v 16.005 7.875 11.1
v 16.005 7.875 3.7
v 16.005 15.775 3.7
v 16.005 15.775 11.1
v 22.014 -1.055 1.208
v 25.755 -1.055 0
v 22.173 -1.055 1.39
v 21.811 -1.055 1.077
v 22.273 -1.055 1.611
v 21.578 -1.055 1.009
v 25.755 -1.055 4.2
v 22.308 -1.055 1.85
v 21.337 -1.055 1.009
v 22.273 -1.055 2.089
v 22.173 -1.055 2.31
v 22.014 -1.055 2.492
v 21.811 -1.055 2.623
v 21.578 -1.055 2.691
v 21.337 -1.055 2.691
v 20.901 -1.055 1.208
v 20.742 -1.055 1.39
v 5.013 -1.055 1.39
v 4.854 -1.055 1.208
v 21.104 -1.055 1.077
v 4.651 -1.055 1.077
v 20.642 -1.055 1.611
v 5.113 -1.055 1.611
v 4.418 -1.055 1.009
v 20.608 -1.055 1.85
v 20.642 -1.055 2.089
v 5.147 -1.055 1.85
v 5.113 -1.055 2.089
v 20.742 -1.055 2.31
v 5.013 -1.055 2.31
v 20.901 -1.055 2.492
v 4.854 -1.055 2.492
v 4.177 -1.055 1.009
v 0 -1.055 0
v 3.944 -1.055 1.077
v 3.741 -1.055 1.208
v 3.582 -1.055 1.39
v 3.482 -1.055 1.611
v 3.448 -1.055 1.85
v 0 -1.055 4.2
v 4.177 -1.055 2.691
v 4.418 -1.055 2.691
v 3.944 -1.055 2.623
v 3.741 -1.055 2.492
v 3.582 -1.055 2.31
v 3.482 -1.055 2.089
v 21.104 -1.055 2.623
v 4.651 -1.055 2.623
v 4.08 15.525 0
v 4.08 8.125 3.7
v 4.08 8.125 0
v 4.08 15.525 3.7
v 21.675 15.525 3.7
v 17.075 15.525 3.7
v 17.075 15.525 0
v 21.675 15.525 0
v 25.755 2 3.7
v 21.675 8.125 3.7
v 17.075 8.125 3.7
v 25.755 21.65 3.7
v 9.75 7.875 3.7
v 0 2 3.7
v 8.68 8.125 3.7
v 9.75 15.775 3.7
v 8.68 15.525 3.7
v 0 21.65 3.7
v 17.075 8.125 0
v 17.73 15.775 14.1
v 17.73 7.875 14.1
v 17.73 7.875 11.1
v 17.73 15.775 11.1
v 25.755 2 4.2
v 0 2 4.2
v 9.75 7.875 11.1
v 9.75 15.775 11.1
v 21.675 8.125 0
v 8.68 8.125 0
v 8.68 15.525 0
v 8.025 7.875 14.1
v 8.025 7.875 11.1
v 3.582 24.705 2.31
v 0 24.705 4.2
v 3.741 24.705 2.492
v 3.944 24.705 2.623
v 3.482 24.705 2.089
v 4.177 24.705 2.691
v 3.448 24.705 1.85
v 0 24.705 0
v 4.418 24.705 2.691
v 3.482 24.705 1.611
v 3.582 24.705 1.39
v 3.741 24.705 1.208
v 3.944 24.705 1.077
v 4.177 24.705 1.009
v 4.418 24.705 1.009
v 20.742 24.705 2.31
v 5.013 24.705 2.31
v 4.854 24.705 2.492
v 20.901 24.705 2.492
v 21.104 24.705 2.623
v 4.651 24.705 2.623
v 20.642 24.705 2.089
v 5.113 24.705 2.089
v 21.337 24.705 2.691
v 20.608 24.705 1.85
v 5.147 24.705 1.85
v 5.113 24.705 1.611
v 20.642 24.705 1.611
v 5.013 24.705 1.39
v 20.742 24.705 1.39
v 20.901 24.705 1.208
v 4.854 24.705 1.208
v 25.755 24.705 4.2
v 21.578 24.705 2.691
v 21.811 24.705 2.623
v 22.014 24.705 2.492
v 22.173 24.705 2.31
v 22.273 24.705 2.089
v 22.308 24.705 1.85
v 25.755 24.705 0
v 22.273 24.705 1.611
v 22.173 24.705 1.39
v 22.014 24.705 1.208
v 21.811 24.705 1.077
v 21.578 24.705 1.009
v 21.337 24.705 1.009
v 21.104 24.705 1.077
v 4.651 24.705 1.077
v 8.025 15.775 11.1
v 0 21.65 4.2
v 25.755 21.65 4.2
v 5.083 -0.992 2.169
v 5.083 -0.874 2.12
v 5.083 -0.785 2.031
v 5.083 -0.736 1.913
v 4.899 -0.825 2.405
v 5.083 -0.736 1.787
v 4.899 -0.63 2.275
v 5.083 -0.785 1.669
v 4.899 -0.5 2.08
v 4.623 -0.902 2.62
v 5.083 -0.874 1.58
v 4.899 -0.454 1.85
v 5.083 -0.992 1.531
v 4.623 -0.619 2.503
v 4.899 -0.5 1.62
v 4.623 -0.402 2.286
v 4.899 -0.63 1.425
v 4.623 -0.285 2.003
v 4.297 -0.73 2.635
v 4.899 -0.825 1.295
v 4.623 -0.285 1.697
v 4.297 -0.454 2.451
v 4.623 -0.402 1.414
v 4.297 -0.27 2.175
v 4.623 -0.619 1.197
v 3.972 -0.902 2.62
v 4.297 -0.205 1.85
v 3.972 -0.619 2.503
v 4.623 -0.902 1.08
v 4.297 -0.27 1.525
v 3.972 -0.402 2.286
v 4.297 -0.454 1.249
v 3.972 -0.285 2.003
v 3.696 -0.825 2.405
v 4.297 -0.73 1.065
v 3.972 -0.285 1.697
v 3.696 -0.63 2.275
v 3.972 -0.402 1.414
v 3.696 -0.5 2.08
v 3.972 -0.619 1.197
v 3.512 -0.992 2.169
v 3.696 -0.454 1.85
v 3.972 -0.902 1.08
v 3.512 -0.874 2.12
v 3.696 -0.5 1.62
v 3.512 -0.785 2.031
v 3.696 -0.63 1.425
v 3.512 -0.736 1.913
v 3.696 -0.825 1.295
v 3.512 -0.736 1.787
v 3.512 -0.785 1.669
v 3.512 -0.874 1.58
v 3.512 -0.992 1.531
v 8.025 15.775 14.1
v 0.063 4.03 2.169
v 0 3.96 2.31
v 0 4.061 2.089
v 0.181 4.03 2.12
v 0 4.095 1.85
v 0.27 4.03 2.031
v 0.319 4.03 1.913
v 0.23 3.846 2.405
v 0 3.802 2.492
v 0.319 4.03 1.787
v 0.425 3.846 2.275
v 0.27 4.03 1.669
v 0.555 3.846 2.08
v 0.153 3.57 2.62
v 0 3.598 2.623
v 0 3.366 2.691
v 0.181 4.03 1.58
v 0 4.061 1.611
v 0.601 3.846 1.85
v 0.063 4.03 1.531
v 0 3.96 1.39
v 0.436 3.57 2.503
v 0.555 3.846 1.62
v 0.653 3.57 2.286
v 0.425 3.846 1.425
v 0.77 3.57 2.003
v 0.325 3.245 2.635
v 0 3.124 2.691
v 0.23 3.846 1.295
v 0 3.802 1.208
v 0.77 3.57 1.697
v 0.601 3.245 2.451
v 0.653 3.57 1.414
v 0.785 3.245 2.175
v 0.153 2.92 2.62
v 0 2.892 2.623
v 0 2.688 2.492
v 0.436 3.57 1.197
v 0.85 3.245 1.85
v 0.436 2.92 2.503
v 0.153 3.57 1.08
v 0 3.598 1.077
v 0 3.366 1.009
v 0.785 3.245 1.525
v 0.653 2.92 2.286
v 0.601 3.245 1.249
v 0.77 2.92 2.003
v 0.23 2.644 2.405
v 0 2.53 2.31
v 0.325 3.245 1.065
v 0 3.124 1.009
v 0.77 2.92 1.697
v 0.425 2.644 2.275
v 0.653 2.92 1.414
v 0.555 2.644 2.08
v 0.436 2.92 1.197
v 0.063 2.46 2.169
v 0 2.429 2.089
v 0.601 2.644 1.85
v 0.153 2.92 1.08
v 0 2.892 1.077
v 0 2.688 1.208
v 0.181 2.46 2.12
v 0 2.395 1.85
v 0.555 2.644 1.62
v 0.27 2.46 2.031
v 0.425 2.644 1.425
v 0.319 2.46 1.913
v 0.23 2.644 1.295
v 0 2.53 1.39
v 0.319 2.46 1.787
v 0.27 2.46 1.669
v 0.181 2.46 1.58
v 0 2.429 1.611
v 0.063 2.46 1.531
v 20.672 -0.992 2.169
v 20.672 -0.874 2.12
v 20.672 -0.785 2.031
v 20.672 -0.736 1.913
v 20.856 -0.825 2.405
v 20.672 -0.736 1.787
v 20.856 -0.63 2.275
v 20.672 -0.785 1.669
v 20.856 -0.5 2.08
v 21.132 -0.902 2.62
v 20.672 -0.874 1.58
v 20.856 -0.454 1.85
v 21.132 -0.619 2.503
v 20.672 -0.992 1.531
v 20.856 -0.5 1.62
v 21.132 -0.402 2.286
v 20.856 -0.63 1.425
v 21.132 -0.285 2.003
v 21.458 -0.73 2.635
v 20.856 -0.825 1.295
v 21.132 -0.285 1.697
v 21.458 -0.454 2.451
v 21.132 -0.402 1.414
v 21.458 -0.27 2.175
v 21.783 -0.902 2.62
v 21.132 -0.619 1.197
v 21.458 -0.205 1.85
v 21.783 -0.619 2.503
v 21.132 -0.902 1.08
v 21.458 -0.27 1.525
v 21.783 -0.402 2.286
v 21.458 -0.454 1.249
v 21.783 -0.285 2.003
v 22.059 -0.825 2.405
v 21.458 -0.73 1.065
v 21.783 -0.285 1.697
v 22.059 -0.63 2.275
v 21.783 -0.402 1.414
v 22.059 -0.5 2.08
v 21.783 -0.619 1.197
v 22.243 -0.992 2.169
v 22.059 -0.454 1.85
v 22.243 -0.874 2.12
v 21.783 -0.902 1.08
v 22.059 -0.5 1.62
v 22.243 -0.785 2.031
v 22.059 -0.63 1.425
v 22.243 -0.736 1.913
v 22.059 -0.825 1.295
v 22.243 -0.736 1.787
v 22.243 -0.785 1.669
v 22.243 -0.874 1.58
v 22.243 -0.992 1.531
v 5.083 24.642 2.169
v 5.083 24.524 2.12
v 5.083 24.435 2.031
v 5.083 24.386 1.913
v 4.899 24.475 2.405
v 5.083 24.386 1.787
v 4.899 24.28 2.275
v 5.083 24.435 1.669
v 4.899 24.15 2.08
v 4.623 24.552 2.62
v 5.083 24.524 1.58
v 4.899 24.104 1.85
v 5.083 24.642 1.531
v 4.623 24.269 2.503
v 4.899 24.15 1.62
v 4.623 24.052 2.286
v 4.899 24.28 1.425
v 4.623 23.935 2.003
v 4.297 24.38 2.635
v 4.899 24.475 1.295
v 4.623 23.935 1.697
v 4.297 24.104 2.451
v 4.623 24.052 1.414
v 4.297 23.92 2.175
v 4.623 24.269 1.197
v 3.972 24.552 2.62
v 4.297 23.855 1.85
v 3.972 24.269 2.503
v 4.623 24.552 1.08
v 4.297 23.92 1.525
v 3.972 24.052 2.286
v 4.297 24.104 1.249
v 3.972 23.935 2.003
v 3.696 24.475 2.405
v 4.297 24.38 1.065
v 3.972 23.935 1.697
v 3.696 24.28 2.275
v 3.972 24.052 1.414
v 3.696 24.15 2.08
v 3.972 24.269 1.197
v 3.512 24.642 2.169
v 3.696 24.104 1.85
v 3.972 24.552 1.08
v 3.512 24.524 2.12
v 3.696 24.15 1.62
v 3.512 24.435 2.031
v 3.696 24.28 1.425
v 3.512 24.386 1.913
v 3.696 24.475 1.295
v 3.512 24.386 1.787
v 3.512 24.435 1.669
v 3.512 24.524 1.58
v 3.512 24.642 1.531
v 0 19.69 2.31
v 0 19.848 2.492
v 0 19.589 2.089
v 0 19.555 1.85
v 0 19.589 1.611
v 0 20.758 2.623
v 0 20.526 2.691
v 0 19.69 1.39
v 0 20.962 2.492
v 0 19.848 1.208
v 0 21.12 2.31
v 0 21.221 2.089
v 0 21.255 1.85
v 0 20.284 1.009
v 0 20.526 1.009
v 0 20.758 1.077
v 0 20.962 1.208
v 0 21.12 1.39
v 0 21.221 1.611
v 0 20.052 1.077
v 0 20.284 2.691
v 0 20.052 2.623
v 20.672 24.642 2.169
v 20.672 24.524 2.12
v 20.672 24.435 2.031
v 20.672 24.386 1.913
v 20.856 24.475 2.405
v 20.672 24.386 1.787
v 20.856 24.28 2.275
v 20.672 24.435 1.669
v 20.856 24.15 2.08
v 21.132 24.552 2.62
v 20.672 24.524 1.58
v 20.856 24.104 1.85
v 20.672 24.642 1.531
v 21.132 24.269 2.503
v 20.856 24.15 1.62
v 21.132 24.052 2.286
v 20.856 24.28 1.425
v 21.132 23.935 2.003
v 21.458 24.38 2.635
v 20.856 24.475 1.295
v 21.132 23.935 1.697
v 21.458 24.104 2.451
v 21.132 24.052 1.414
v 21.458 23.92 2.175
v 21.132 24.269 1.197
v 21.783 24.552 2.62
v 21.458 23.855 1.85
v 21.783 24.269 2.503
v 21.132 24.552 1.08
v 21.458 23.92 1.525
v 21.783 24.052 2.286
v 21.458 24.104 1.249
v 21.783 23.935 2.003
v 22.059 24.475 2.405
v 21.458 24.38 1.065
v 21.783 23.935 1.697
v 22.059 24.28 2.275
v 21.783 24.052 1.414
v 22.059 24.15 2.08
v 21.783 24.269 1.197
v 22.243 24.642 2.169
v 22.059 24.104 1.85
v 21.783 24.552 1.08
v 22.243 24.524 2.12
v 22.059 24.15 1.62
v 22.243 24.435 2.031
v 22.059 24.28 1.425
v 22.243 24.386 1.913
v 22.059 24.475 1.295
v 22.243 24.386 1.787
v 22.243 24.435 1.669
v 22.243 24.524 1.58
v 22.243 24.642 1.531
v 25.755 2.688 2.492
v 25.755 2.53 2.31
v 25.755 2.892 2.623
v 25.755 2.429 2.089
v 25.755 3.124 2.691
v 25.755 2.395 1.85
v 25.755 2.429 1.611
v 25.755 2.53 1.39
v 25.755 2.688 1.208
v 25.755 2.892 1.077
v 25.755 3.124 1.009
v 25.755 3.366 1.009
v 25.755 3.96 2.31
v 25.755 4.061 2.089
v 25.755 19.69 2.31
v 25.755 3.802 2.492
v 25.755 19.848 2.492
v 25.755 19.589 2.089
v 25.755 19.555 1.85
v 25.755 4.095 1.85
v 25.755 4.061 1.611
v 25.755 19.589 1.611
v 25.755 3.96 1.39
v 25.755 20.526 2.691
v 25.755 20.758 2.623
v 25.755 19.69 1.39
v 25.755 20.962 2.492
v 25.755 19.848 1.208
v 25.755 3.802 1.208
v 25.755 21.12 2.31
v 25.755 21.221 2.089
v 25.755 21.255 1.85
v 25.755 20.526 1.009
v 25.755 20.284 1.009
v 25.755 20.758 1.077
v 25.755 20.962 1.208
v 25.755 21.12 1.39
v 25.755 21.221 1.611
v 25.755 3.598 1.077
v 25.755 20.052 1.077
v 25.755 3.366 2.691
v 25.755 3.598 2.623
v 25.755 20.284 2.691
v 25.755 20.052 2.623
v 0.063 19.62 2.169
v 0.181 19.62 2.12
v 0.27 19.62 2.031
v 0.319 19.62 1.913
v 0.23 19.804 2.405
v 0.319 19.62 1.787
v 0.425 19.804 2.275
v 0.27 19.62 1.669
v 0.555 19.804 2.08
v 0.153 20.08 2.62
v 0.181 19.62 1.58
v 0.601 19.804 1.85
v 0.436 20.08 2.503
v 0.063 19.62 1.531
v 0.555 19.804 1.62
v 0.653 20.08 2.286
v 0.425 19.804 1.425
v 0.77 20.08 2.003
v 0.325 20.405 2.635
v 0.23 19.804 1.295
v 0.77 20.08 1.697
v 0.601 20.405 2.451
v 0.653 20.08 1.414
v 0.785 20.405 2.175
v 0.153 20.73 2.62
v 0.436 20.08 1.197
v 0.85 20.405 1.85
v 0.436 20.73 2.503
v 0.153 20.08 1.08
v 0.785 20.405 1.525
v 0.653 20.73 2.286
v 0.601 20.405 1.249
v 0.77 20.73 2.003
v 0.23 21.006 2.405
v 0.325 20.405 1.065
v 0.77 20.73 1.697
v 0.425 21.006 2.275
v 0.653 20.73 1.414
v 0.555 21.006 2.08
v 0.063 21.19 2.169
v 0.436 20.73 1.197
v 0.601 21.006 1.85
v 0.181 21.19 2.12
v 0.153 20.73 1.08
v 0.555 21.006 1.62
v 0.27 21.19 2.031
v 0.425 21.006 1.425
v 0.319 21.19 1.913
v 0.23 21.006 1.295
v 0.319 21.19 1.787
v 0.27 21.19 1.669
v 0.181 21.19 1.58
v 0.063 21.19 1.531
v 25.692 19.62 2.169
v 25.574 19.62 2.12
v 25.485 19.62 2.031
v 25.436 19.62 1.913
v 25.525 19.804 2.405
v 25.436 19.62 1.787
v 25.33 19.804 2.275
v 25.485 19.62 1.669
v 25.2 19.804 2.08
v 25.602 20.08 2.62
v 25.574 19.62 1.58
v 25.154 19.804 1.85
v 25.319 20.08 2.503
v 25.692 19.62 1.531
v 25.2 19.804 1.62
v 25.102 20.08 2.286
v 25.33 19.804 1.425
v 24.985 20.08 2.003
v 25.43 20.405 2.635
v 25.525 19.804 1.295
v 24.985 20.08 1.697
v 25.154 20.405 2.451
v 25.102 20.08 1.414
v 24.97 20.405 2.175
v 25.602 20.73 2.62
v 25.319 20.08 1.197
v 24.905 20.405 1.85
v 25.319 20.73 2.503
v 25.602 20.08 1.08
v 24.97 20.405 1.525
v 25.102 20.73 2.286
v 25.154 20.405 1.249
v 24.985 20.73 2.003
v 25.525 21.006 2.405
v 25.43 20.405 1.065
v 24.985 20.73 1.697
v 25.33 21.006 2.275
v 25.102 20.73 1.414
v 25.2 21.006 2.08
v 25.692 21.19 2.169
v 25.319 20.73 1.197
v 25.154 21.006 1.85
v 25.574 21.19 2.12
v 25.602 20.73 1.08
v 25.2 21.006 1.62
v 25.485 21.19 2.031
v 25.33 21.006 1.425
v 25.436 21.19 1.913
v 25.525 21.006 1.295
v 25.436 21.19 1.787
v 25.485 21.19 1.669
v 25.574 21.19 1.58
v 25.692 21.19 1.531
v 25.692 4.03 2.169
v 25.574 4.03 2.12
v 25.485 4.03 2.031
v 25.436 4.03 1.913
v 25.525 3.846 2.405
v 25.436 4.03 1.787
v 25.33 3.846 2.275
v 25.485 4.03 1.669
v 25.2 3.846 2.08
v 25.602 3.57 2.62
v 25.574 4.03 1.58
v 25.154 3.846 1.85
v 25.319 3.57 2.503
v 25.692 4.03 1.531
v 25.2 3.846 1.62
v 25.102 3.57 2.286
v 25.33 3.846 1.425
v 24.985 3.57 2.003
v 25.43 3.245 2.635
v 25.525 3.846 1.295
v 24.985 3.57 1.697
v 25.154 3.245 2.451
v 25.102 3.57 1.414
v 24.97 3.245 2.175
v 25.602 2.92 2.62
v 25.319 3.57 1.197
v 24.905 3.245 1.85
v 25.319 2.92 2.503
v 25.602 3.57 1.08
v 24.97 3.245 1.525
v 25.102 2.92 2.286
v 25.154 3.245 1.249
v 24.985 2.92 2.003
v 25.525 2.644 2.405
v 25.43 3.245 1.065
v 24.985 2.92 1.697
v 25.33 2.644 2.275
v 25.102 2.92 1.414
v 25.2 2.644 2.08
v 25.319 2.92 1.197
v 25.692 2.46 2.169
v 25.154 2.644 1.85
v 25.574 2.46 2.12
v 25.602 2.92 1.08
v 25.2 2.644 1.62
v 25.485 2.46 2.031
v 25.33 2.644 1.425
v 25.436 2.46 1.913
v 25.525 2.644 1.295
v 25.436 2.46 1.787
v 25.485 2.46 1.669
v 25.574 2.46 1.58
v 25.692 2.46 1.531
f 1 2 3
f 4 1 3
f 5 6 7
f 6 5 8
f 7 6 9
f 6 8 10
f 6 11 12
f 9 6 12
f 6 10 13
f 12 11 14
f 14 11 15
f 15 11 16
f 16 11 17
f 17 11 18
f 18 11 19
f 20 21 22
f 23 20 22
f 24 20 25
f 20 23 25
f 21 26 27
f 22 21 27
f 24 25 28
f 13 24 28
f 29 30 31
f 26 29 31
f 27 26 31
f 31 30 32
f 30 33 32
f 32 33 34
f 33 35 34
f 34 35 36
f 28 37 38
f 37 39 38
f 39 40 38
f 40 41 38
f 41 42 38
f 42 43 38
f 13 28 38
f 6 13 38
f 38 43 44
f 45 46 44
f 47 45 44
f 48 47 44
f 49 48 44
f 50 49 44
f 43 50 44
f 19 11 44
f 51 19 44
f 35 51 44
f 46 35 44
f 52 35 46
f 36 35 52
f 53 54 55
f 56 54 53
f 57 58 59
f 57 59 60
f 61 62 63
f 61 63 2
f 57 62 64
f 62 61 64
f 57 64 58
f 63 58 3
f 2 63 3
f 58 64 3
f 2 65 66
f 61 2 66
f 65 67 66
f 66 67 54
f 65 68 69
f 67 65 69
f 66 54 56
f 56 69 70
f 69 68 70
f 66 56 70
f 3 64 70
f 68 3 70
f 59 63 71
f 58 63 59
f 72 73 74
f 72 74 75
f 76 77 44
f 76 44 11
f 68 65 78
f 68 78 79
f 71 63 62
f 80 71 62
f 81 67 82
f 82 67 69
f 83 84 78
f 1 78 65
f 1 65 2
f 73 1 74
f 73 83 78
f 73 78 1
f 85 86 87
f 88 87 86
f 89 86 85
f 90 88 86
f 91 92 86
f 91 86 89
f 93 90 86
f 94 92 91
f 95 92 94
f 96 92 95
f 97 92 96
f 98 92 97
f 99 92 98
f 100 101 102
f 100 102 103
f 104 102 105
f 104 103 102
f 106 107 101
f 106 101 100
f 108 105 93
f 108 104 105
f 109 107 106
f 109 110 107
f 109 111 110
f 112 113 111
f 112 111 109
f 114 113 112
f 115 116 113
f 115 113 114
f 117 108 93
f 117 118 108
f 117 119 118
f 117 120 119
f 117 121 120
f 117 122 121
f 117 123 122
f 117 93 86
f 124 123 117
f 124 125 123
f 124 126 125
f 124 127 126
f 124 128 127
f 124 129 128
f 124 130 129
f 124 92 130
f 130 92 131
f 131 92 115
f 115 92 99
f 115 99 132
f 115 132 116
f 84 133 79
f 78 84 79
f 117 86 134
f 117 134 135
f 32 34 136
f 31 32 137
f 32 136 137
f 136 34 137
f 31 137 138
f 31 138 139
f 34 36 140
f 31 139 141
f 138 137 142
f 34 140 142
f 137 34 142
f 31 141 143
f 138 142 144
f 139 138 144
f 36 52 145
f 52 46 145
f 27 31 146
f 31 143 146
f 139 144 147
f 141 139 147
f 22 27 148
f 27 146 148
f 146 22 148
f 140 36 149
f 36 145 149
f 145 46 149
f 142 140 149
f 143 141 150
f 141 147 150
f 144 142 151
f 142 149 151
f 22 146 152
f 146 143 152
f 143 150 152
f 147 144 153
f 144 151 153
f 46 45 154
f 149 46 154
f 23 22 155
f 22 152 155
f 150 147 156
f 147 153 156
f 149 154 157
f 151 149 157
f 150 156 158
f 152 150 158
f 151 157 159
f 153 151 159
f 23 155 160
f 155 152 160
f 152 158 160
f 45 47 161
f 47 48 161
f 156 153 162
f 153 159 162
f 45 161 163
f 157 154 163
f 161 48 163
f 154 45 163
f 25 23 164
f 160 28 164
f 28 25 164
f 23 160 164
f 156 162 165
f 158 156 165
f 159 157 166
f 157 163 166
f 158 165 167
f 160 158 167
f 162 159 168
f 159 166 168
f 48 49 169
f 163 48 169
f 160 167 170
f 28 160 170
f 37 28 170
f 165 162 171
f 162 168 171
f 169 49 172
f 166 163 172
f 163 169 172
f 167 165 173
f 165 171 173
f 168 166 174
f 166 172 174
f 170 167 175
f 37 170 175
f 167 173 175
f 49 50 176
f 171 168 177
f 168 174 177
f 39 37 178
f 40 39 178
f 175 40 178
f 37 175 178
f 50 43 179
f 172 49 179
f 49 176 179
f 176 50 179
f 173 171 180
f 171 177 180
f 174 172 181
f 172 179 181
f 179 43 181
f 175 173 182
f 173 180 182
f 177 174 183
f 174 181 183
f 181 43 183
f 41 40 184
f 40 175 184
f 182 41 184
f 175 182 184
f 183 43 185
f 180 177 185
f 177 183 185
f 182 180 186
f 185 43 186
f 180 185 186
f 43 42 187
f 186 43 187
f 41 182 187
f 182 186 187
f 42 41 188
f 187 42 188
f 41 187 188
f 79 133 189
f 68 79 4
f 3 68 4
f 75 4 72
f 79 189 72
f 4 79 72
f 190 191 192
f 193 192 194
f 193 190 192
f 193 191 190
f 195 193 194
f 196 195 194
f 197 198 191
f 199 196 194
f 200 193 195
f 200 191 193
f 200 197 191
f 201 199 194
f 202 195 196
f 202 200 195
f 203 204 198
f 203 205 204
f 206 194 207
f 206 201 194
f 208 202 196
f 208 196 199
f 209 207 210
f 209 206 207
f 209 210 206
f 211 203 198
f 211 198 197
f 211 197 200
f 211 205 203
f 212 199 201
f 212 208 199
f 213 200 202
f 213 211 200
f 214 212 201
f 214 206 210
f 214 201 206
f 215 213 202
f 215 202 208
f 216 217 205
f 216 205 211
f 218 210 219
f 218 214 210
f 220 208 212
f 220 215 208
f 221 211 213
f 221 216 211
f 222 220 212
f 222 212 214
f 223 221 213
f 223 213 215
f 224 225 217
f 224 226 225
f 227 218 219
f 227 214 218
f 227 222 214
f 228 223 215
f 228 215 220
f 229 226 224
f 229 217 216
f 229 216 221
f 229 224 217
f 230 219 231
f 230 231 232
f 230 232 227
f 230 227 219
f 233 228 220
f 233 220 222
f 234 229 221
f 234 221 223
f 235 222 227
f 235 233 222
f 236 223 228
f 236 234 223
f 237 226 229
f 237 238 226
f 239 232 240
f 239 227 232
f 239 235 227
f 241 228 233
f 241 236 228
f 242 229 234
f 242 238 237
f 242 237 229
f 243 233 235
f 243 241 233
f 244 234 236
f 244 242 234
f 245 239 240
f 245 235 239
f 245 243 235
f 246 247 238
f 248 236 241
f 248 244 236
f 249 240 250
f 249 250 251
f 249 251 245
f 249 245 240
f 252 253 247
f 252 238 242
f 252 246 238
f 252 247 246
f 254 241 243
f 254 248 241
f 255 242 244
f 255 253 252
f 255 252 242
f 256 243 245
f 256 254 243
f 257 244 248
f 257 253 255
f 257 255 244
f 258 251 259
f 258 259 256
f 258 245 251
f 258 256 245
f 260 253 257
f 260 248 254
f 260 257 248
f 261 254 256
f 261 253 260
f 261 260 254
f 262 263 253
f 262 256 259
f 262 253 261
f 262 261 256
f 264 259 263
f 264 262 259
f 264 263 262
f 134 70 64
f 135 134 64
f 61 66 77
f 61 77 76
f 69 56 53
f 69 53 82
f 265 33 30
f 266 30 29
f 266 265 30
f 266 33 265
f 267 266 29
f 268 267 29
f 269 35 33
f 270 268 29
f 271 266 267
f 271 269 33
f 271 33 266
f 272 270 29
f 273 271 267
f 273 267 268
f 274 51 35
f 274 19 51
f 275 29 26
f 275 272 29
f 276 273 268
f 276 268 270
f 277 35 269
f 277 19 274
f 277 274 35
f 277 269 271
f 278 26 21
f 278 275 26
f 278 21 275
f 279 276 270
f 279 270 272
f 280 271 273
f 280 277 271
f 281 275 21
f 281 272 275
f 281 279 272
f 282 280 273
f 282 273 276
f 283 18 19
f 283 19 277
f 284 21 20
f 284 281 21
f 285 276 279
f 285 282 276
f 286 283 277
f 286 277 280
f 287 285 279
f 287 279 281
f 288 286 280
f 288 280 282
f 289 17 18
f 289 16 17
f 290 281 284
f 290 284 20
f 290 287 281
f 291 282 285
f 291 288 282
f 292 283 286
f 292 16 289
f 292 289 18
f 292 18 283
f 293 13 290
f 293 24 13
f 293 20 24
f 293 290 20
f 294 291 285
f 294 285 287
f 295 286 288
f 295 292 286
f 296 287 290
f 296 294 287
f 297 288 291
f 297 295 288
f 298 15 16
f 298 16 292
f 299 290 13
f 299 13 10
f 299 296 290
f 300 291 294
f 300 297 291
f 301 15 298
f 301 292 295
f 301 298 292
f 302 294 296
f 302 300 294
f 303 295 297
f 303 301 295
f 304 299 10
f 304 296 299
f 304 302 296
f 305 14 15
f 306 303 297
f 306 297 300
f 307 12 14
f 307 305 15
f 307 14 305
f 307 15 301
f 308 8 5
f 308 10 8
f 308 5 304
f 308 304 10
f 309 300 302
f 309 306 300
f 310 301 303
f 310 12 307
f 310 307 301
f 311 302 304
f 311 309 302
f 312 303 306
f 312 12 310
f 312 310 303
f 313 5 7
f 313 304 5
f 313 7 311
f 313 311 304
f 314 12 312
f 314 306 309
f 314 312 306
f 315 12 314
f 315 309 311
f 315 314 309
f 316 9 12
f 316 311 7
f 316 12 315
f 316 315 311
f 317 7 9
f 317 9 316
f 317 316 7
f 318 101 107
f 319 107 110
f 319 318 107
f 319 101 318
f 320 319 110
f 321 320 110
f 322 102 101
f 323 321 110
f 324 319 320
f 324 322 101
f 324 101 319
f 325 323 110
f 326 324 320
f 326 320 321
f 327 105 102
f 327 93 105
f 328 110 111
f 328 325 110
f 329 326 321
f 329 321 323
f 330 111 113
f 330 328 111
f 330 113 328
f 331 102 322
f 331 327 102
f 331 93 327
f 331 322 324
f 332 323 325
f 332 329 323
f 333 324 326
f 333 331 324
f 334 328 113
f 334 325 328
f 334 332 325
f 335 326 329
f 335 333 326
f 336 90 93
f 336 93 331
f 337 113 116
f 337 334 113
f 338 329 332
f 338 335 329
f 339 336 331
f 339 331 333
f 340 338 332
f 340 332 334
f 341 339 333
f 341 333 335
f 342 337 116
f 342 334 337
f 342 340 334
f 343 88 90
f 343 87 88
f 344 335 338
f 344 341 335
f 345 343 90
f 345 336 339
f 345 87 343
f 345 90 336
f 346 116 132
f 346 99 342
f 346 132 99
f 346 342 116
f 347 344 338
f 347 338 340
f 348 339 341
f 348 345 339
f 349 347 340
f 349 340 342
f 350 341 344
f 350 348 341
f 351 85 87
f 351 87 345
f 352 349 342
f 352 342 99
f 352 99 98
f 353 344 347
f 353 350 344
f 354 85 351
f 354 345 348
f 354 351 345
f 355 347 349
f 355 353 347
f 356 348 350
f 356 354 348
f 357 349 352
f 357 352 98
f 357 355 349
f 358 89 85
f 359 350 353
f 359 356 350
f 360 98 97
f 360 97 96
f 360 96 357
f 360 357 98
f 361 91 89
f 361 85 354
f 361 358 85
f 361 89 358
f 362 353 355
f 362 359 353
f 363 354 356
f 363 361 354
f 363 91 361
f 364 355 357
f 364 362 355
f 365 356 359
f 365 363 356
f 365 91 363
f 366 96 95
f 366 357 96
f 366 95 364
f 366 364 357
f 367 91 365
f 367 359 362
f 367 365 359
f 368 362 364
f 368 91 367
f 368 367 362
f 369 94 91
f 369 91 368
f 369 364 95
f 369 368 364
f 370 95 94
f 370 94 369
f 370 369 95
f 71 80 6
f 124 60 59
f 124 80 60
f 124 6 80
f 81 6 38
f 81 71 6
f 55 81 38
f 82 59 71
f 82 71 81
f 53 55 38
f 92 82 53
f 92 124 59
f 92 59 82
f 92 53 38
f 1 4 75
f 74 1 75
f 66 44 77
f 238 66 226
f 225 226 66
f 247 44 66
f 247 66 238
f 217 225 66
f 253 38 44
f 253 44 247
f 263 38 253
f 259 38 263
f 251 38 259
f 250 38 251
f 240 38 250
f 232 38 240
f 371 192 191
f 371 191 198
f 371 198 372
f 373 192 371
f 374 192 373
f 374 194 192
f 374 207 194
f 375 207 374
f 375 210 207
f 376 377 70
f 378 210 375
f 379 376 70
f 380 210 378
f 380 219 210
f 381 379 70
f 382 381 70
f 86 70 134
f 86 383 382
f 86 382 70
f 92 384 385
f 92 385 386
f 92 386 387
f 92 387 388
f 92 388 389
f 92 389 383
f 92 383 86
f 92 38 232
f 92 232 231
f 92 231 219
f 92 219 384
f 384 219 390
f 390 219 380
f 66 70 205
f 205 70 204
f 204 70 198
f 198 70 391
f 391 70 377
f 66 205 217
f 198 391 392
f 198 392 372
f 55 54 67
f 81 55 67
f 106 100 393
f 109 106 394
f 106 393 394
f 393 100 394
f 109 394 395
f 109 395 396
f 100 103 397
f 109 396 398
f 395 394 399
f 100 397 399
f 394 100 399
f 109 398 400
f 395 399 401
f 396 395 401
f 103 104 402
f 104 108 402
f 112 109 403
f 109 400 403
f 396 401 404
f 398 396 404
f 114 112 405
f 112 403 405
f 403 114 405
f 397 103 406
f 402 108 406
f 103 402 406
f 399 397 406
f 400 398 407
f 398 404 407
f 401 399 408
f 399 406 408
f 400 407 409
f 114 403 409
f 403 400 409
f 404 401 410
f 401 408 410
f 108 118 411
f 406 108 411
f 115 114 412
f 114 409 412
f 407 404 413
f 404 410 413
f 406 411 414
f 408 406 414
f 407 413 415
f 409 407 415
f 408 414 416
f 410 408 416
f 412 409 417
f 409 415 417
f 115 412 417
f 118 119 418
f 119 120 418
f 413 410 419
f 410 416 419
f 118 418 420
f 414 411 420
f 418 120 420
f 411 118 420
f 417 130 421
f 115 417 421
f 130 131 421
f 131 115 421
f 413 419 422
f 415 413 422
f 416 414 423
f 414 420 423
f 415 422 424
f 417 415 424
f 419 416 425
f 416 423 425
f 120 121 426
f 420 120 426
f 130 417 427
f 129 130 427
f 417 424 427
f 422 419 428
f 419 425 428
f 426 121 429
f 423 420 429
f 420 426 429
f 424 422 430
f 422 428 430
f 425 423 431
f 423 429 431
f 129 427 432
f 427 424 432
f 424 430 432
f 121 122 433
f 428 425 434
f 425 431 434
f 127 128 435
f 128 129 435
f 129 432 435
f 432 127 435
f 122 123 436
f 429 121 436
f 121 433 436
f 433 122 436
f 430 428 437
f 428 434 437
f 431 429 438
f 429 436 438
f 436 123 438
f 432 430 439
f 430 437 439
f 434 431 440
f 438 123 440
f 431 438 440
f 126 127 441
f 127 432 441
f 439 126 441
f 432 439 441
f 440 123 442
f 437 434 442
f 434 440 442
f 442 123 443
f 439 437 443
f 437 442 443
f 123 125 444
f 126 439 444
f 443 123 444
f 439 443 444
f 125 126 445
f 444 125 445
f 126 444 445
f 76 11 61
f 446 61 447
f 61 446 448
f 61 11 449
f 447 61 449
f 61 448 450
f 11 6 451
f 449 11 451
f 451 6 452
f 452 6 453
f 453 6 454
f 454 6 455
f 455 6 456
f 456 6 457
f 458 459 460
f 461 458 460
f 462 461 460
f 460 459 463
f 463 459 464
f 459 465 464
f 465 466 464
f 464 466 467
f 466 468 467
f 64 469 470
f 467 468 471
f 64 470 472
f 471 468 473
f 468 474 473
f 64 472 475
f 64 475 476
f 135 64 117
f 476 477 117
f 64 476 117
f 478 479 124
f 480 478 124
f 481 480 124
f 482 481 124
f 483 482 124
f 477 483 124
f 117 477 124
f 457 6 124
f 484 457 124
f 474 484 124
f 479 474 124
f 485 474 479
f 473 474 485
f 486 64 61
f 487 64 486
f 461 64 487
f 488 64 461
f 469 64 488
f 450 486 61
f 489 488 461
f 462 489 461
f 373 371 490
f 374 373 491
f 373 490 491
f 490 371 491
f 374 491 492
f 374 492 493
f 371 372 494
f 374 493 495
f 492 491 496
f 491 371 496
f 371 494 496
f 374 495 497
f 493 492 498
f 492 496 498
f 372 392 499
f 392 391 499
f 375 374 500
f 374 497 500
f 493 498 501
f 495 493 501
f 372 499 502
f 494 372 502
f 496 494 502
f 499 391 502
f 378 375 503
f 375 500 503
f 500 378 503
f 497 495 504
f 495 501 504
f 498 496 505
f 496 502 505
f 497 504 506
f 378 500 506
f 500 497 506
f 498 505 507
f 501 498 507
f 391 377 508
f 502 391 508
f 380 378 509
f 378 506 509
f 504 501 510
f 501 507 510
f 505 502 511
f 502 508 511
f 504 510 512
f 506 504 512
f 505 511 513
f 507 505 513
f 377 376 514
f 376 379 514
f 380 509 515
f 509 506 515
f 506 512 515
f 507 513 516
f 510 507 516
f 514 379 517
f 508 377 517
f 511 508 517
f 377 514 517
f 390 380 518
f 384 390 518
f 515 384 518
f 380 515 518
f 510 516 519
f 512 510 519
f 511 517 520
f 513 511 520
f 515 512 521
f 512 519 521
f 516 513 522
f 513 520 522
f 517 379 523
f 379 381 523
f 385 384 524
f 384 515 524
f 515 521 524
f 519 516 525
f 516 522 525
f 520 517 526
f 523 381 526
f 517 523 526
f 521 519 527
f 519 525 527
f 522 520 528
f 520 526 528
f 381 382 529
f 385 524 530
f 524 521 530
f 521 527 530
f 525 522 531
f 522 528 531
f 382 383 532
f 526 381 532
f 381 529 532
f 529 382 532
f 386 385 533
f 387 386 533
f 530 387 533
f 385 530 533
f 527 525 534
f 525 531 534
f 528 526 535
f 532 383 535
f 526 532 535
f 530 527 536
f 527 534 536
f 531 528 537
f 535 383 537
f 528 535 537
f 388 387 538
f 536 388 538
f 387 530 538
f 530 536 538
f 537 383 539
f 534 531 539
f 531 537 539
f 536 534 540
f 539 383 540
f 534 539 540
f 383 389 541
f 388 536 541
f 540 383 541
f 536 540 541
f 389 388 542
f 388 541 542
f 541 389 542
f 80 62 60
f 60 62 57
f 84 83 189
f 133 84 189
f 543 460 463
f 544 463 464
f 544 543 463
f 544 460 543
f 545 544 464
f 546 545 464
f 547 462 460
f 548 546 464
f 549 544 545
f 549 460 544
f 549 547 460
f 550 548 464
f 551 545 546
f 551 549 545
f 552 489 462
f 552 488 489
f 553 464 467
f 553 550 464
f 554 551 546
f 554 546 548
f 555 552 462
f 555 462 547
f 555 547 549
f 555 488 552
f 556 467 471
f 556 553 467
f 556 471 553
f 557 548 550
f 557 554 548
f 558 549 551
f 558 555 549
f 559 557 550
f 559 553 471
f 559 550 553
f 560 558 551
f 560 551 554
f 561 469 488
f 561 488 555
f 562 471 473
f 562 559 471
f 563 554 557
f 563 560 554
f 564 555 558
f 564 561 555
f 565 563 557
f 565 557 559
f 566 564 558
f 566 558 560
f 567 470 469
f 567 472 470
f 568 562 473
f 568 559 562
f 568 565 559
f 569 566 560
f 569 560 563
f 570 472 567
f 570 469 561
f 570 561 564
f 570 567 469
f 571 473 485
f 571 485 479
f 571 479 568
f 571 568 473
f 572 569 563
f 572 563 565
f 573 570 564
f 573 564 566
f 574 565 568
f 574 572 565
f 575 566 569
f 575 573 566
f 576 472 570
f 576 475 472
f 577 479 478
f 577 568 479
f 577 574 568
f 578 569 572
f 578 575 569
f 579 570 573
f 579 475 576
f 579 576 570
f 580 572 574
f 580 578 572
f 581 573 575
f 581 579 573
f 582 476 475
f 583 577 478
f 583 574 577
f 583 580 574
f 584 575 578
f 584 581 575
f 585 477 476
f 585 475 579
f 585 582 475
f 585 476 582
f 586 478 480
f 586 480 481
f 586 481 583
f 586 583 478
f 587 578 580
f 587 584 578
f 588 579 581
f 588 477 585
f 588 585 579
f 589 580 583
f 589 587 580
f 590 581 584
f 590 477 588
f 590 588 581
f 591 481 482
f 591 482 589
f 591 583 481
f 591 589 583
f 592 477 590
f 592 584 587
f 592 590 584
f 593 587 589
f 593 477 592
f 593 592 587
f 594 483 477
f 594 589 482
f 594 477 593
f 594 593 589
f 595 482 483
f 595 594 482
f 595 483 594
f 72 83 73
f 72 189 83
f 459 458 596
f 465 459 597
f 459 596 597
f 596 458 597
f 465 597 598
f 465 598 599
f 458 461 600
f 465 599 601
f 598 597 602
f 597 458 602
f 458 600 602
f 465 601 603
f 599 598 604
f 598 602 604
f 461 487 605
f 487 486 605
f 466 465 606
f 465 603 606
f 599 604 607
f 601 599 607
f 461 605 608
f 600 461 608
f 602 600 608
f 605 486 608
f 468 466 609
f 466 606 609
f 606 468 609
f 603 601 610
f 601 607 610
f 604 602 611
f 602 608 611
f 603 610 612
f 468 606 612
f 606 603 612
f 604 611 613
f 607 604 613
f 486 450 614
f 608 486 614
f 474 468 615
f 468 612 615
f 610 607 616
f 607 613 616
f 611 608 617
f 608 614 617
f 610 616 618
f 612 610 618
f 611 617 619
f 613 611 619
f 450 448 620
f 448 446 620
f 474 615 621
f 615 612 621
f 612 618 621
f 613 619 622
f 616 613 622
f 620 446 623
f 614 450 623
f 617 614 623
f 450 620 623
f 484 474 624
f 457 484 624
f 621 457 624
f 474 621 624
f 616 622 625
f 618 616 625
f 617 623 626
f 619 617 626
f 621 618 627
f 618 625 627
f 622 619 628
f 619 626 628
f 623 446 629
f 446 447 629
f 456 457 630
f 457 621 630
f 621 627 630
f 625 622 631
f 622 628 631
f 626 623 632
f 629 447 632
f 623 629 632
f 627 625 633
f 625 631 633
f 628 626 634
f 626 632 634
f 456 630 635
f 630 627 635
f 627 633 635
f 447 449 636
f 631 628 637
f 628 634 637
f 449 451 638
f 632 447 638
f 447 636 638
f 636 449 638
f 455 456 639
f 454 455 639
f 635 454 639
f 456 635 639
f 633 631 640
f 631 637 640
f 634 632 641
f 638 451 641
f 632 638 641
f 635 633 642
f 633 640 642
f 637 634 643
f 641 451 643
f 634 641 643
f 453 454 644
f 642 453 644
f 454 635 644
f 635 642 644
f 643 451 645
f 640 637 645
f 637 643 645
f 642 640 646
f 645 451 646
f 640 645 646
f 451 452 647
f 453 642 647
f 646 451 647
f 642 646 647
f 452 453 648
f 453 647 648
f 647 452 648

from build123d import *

# Parameters (mm, degrees)
EXTRUDE_1_DEPTH     = 3.7
CUT_EXTRUDE_1_REACH = 37.162
SKETCH_2_W          = 4.6
SKETCH_2_H          = 7.4
SKETCH_3_W          = 25.755
SKETCH_3_H          = 2
EXTRUDE_2_DEPTH     = 1
SKETCH_4_W          = 6.255
SKETCH_4_H          = 7.9
SKETCH_4_W_2        = 2.95
EXTRUDE_3_DEPTH     = 10.4
SKETCH_5_W          = 1.725
SKETCH_5_H          = 7.9
EXTRUDE_4_DEPTH     = 3
CUT_EXTRUDE_START   = -7.9
SKETCH_9_W          = 2.95
SKETCH_9_H          = 9.4
CUT_EXTRUDE_4_DEPTH = 7.9
FILLET_2_R          = 0.4
CUT_EXTRUDE_5_DEPTH = 7.9
CUT_EXTRUDE_START_2 = -25.755
SKETCH_12_W         = 1
SKETCH_12_H         = 2
CUT_EXTRUDE_6_DEPTH = 25.755
EXTRUDE_START       = -3.7
SKETCH_13_W         = 25.755
SKETCH_13_H         = 1.055
EXTRUDE_6_DEPTH     = 3.7
CUT_REVOLVE_1_ANGLE = 180
SKETCH_16_W         = 25.755
SKETCH_16_H         = 3.055
EXTRUDE_7_DEPTH     = 0.5


with BuildPart() as part:
    # ｽｹｯﾁ1 → ﾎﾞｽ - 押し出し1 (new body)
    with BuildSketch(Plane.XY):
        Polygon((0, 0), (12.75, 0), (25.755, 0), (25.755, 23.65), (12.75, 23.65), (0, 23.65), align=None)
    extrude(amount=EXTRUDE_1_DEPTH)

    # ｽｹｯﾁ2 → ｶｯﾄ - 押し出し1 (cut, up to next)
    with BuildSketch(Plane.XY.offset(3.7), mode=Mode.PRIVATE) as cut_extrude_1_sk1:
        with Locations((6.38, 11.825)):
            Rectangle(SKETCH_2_W, SKETCH_2_H)
    cut_extrude_1_tool1 = extrude(cut_extrude_1_sk1.sketch, amount=-CUT_EXTRUDE_1_REACH, mode=Mode.PRIVATE) & part.part
    # ｽｹｯﾁ2 → ｶｯﾄ - 押し出し1 (cut, up to next)
    with BuildSketch(Plane.XY.offset(3.7), mode=Mode.PRIVATE) as cut_extrude_1_sk2:
        with Locations((19.375, 11.825)):
            Rectangle(SKETCH_2_W, SKETCH_2_H)
    cut_extrude_1_tool2 = extrude(cut_extrude_1_sk2.sketch, amount=-CUT_EXTRUDE_1_REACH, mode=Mode.PRIVATE) & part.part
    add(cut_extrude_1_tool1.solids().sort_by_distance((6.38, 11.825, 3.7))[0], mode=Mode.SUBTRACT)
    add(cut_extrude_1_tool2.solids().sort_by_distance((19.375, 11.825, 3.7))[0], mode=Mode.SUBTRACT)

    # ｽｹｯﾁ3 → ﾎﾞｽ - 押し出し2 (add)
    with BuildSketch(Plane.XY.offset(3.7)):
        with Locations((12.8775, 22.65)):
            Rectangle(SKETCH_3_W, SKETCH_3_H)
        with Locations((12.8775, 1)):
            Rectangle(SKETCH_3_W, SKETCH_3_H)
    extrude(amount=EXTRUDE_2_DEPTH)

    # ｽｹｯﾁ4 → ﾎﾞｽ - 押し出し3 (add)
    with BuildSketch(Plane.XY.offset(3.7)):
        with Locations((12.8775, 11.825)):
            Rectangle(SKETCH_4_W, SKETCH_4_H)
        with Locations((1.475, 11.825)):
            Rectangle(SKETCH_4_W_2, SKETCH_4_H)
        with Locations((24.28, 11.825)):
            Rectangle(SKETCH_4_W_2, SKETCH_4_H)
    extrude(amount=EXTRUDE_3_DEPTH)

    # ｽｹｯﾁ5 → ﾎﾞｽ - 押し出し4 (add)
    with BuildSketch(Plane.XY.offset(14.1)):
        with Locations((16.8675, 11.825)):
            Rectangle(SKETCH_5_W, SKETCH_5_H)
        with Locations((8.8875, 11.825)):
            Rectangle(SKETCH_5_W, SKETCH_5_H)
    extrude(amount=-EXTRUDE_4_DEPTH)

    # ｽｹｯﾁ9 → ｶｯﾄ - 押し出し4 (cut)
    with BuildSketch(Plane.XZ.offset(-7.875).offset(CUT_EXTRUDE_START)):
        with Locations((1.475, 9.4)):
            Rectangle(SKETCH_9_W, SKETCH_9_H)
        with Locations((24.28, 9.4)):
            Rectangle(SKETCH_9_W, SKETCH_9_H)
    extrude(amount=CUT_EXTRUDE_4_DEPTH, mode=Mode.SUBTRACT)

    # ﾌｨﾚｯﾄ2
    fillet_2_edges = [part.edges().sort_by_distance(p)[0] for p in [
        (2.95, 11.825, 4.7),
        (22.805, 11.825, 4.7),
    ]]
    fillet(fillet_2_edges, radius=FILLET_2_R)

    # ｽｹｯﾁ11 → ｶｯﾄ - 押し出し5 (cut)
    with BuildSketch(Plane.XZ.offset(-7.875).offset(CUT_EXTRUDE_START)):
        with BuildLine():
            Line((2.95, 3.7), (2.95, 4.3))
            ThreePointArc((2.95, 4.3), (2.832842712, 4.582842712), (2.55, 4.7))
            Line((2.55, 4.7), (0, 4.7))
            Line((0, 4.7), (0, 3.7))
            Line((0, 3.7), (2.95, 3.7))
        make_face()
        with BuildLine():
            Line((25.755, 4.7), (23.205, 4.7))
            ThreePointArc((23.205, 4.7), (22.922157288, 4.582842712), (22.805, 4.3))
            Line((22.805, 4.3), (22.805, 3.7))
            Line((22.805, 3.7), (25.755, 3.7))
            Line((25.755, 3.7), (25.755, 4.7))
        make_face()
    extrude(amount=CUT_EXTRUDE_5_DEPTH, mode=Mode.SUBTRACT)

    # ｽｹｯﾁ12 → ｶｯﾄ - 押し出し6 (cut)
    with BuildSketch(Plane.ZY.offset(CUT_EXTRUDE_START_2)):
        with Locations((4.2, 22.65)):
            Rectangle(SKETCH_12_W, SKETCH_12_H)
        with Locations((4.2, 1)):
            Rectangle(SKETCH_12_W, SKETCH_12_H)
    extrude(amount=CUT_EXTRUDE_6_DEPTH, mode=Mode.SUBTRACT)

    # ｽｹｯﾁ13 → ﾎﾞｽ - 押し出し6 (add)
    with BuildSketch(Plane(origin=(0, 0, 0), x_dir=(-1, 0, 0), z_dir=(0, 0, -1)).offset(EXTRUDE_START)):
        with Locations((-12.8775, 24.1775)):
            Rectangle(SKETCH_13_W, SKETCH_13_H)
        with Locations((-12.8775, -0.5275)):
            Rectangle(SKETCH_13_W, SKETCH_13_H)
    extrude(amount=EXTRUDE_6_DEPTH)

    # ｽｹｯﾁ14 → ｶｯﾄ - 回転1 (revolve, cut)
    with BuildSketch(Plane(origin=(25.755, 0, 0), x_dir=(0, 0, -1), z_dir=(1, 0, 0))):
        with BuildLine():
            Line((-1.85, 21.255), (-1.85, 19.555))
            ThreePointArc((-1.85, 19.555), (-2.7, 20.405), (-1.85, 21.255))
        make_face()
        with BuildLine():
            Line((-1.85, 2.395), (-1.85, 4.095))
            ThreePointArc((-1.85, 4.095), (-2.7, 3.245), (-1.85, 2.395))
        make_face()
    cut_revolve_1 = revolve(axis=Axis((25.755, 21.255, 1.85), (0, -1, 0)), revolution_arc=CUT_REVOLVE_1_ANGLE, mode=Mode.SUBTRACT)

    # ﾐﾗｰ1: ｶｯﾄ - 回転1 across plane
    add(cut_revolve_1.mirror(Plane(origin=(12.8775, 0, 0), x_dir=(0, 0, 1), z_dir=(1, 0, 0))), mode=Mode.SUBTRACT)

    # ｽｹｯﾁ15 → ｶｯﾄ - 回転2 (revolve, cut)
    with BuildSketch(Plane(origin=(0, 24.705, 0), x_dir=(1, 0, 0), z_dir=(0, 1, 0))):
        with BuildLine():
            Line((3.4475, -1.85), (5.1475, -1.85))
            ThreePointArc((5.1475, -1.85), (4.2975, -2.7), (3.4475, -1.85))
        make_face()
        with BuildLine():
            Line((22.3075, -1.85), (20.6075, -1.85))
            ThreePointArc((20.6075, -1.85), (21.4575, -2.7), (22.3075, -1.85))
        make_face()
    cut_revolve_2 = revolve(axis=Axis((3.4475, 24.705, 1.85), (1, 0, 0)), mode=Mode.SUBTRACT)

    # ﾐﾗｰ2: ｶｯﾄ - 回転2 across plane
    add(cut_revolve_2.mirror(Plane(origin=(0, 11.825, 0), x_dir=(0, 0, 1), z_dir=(0, -1, 0))), mode=Mode.SUBTRACT)

    # ｽｹｯﾁ16 → ﾎﾞｽ - 押し出し7 (add)
    with BuildSketch(Plane.XY.offset(3.7)):
        with Locations((12.8775, 23.1775)):
            Rectangle(SKETCH_16_W, SKETCH_16_H)
        with Locations((12.8775, 0.4725)):
            Rectangle(SKETCH_16_W, SKETCH_16_H)
    extrude(amount=EXTRUDE_7_DEPTH)


solid = part.part
